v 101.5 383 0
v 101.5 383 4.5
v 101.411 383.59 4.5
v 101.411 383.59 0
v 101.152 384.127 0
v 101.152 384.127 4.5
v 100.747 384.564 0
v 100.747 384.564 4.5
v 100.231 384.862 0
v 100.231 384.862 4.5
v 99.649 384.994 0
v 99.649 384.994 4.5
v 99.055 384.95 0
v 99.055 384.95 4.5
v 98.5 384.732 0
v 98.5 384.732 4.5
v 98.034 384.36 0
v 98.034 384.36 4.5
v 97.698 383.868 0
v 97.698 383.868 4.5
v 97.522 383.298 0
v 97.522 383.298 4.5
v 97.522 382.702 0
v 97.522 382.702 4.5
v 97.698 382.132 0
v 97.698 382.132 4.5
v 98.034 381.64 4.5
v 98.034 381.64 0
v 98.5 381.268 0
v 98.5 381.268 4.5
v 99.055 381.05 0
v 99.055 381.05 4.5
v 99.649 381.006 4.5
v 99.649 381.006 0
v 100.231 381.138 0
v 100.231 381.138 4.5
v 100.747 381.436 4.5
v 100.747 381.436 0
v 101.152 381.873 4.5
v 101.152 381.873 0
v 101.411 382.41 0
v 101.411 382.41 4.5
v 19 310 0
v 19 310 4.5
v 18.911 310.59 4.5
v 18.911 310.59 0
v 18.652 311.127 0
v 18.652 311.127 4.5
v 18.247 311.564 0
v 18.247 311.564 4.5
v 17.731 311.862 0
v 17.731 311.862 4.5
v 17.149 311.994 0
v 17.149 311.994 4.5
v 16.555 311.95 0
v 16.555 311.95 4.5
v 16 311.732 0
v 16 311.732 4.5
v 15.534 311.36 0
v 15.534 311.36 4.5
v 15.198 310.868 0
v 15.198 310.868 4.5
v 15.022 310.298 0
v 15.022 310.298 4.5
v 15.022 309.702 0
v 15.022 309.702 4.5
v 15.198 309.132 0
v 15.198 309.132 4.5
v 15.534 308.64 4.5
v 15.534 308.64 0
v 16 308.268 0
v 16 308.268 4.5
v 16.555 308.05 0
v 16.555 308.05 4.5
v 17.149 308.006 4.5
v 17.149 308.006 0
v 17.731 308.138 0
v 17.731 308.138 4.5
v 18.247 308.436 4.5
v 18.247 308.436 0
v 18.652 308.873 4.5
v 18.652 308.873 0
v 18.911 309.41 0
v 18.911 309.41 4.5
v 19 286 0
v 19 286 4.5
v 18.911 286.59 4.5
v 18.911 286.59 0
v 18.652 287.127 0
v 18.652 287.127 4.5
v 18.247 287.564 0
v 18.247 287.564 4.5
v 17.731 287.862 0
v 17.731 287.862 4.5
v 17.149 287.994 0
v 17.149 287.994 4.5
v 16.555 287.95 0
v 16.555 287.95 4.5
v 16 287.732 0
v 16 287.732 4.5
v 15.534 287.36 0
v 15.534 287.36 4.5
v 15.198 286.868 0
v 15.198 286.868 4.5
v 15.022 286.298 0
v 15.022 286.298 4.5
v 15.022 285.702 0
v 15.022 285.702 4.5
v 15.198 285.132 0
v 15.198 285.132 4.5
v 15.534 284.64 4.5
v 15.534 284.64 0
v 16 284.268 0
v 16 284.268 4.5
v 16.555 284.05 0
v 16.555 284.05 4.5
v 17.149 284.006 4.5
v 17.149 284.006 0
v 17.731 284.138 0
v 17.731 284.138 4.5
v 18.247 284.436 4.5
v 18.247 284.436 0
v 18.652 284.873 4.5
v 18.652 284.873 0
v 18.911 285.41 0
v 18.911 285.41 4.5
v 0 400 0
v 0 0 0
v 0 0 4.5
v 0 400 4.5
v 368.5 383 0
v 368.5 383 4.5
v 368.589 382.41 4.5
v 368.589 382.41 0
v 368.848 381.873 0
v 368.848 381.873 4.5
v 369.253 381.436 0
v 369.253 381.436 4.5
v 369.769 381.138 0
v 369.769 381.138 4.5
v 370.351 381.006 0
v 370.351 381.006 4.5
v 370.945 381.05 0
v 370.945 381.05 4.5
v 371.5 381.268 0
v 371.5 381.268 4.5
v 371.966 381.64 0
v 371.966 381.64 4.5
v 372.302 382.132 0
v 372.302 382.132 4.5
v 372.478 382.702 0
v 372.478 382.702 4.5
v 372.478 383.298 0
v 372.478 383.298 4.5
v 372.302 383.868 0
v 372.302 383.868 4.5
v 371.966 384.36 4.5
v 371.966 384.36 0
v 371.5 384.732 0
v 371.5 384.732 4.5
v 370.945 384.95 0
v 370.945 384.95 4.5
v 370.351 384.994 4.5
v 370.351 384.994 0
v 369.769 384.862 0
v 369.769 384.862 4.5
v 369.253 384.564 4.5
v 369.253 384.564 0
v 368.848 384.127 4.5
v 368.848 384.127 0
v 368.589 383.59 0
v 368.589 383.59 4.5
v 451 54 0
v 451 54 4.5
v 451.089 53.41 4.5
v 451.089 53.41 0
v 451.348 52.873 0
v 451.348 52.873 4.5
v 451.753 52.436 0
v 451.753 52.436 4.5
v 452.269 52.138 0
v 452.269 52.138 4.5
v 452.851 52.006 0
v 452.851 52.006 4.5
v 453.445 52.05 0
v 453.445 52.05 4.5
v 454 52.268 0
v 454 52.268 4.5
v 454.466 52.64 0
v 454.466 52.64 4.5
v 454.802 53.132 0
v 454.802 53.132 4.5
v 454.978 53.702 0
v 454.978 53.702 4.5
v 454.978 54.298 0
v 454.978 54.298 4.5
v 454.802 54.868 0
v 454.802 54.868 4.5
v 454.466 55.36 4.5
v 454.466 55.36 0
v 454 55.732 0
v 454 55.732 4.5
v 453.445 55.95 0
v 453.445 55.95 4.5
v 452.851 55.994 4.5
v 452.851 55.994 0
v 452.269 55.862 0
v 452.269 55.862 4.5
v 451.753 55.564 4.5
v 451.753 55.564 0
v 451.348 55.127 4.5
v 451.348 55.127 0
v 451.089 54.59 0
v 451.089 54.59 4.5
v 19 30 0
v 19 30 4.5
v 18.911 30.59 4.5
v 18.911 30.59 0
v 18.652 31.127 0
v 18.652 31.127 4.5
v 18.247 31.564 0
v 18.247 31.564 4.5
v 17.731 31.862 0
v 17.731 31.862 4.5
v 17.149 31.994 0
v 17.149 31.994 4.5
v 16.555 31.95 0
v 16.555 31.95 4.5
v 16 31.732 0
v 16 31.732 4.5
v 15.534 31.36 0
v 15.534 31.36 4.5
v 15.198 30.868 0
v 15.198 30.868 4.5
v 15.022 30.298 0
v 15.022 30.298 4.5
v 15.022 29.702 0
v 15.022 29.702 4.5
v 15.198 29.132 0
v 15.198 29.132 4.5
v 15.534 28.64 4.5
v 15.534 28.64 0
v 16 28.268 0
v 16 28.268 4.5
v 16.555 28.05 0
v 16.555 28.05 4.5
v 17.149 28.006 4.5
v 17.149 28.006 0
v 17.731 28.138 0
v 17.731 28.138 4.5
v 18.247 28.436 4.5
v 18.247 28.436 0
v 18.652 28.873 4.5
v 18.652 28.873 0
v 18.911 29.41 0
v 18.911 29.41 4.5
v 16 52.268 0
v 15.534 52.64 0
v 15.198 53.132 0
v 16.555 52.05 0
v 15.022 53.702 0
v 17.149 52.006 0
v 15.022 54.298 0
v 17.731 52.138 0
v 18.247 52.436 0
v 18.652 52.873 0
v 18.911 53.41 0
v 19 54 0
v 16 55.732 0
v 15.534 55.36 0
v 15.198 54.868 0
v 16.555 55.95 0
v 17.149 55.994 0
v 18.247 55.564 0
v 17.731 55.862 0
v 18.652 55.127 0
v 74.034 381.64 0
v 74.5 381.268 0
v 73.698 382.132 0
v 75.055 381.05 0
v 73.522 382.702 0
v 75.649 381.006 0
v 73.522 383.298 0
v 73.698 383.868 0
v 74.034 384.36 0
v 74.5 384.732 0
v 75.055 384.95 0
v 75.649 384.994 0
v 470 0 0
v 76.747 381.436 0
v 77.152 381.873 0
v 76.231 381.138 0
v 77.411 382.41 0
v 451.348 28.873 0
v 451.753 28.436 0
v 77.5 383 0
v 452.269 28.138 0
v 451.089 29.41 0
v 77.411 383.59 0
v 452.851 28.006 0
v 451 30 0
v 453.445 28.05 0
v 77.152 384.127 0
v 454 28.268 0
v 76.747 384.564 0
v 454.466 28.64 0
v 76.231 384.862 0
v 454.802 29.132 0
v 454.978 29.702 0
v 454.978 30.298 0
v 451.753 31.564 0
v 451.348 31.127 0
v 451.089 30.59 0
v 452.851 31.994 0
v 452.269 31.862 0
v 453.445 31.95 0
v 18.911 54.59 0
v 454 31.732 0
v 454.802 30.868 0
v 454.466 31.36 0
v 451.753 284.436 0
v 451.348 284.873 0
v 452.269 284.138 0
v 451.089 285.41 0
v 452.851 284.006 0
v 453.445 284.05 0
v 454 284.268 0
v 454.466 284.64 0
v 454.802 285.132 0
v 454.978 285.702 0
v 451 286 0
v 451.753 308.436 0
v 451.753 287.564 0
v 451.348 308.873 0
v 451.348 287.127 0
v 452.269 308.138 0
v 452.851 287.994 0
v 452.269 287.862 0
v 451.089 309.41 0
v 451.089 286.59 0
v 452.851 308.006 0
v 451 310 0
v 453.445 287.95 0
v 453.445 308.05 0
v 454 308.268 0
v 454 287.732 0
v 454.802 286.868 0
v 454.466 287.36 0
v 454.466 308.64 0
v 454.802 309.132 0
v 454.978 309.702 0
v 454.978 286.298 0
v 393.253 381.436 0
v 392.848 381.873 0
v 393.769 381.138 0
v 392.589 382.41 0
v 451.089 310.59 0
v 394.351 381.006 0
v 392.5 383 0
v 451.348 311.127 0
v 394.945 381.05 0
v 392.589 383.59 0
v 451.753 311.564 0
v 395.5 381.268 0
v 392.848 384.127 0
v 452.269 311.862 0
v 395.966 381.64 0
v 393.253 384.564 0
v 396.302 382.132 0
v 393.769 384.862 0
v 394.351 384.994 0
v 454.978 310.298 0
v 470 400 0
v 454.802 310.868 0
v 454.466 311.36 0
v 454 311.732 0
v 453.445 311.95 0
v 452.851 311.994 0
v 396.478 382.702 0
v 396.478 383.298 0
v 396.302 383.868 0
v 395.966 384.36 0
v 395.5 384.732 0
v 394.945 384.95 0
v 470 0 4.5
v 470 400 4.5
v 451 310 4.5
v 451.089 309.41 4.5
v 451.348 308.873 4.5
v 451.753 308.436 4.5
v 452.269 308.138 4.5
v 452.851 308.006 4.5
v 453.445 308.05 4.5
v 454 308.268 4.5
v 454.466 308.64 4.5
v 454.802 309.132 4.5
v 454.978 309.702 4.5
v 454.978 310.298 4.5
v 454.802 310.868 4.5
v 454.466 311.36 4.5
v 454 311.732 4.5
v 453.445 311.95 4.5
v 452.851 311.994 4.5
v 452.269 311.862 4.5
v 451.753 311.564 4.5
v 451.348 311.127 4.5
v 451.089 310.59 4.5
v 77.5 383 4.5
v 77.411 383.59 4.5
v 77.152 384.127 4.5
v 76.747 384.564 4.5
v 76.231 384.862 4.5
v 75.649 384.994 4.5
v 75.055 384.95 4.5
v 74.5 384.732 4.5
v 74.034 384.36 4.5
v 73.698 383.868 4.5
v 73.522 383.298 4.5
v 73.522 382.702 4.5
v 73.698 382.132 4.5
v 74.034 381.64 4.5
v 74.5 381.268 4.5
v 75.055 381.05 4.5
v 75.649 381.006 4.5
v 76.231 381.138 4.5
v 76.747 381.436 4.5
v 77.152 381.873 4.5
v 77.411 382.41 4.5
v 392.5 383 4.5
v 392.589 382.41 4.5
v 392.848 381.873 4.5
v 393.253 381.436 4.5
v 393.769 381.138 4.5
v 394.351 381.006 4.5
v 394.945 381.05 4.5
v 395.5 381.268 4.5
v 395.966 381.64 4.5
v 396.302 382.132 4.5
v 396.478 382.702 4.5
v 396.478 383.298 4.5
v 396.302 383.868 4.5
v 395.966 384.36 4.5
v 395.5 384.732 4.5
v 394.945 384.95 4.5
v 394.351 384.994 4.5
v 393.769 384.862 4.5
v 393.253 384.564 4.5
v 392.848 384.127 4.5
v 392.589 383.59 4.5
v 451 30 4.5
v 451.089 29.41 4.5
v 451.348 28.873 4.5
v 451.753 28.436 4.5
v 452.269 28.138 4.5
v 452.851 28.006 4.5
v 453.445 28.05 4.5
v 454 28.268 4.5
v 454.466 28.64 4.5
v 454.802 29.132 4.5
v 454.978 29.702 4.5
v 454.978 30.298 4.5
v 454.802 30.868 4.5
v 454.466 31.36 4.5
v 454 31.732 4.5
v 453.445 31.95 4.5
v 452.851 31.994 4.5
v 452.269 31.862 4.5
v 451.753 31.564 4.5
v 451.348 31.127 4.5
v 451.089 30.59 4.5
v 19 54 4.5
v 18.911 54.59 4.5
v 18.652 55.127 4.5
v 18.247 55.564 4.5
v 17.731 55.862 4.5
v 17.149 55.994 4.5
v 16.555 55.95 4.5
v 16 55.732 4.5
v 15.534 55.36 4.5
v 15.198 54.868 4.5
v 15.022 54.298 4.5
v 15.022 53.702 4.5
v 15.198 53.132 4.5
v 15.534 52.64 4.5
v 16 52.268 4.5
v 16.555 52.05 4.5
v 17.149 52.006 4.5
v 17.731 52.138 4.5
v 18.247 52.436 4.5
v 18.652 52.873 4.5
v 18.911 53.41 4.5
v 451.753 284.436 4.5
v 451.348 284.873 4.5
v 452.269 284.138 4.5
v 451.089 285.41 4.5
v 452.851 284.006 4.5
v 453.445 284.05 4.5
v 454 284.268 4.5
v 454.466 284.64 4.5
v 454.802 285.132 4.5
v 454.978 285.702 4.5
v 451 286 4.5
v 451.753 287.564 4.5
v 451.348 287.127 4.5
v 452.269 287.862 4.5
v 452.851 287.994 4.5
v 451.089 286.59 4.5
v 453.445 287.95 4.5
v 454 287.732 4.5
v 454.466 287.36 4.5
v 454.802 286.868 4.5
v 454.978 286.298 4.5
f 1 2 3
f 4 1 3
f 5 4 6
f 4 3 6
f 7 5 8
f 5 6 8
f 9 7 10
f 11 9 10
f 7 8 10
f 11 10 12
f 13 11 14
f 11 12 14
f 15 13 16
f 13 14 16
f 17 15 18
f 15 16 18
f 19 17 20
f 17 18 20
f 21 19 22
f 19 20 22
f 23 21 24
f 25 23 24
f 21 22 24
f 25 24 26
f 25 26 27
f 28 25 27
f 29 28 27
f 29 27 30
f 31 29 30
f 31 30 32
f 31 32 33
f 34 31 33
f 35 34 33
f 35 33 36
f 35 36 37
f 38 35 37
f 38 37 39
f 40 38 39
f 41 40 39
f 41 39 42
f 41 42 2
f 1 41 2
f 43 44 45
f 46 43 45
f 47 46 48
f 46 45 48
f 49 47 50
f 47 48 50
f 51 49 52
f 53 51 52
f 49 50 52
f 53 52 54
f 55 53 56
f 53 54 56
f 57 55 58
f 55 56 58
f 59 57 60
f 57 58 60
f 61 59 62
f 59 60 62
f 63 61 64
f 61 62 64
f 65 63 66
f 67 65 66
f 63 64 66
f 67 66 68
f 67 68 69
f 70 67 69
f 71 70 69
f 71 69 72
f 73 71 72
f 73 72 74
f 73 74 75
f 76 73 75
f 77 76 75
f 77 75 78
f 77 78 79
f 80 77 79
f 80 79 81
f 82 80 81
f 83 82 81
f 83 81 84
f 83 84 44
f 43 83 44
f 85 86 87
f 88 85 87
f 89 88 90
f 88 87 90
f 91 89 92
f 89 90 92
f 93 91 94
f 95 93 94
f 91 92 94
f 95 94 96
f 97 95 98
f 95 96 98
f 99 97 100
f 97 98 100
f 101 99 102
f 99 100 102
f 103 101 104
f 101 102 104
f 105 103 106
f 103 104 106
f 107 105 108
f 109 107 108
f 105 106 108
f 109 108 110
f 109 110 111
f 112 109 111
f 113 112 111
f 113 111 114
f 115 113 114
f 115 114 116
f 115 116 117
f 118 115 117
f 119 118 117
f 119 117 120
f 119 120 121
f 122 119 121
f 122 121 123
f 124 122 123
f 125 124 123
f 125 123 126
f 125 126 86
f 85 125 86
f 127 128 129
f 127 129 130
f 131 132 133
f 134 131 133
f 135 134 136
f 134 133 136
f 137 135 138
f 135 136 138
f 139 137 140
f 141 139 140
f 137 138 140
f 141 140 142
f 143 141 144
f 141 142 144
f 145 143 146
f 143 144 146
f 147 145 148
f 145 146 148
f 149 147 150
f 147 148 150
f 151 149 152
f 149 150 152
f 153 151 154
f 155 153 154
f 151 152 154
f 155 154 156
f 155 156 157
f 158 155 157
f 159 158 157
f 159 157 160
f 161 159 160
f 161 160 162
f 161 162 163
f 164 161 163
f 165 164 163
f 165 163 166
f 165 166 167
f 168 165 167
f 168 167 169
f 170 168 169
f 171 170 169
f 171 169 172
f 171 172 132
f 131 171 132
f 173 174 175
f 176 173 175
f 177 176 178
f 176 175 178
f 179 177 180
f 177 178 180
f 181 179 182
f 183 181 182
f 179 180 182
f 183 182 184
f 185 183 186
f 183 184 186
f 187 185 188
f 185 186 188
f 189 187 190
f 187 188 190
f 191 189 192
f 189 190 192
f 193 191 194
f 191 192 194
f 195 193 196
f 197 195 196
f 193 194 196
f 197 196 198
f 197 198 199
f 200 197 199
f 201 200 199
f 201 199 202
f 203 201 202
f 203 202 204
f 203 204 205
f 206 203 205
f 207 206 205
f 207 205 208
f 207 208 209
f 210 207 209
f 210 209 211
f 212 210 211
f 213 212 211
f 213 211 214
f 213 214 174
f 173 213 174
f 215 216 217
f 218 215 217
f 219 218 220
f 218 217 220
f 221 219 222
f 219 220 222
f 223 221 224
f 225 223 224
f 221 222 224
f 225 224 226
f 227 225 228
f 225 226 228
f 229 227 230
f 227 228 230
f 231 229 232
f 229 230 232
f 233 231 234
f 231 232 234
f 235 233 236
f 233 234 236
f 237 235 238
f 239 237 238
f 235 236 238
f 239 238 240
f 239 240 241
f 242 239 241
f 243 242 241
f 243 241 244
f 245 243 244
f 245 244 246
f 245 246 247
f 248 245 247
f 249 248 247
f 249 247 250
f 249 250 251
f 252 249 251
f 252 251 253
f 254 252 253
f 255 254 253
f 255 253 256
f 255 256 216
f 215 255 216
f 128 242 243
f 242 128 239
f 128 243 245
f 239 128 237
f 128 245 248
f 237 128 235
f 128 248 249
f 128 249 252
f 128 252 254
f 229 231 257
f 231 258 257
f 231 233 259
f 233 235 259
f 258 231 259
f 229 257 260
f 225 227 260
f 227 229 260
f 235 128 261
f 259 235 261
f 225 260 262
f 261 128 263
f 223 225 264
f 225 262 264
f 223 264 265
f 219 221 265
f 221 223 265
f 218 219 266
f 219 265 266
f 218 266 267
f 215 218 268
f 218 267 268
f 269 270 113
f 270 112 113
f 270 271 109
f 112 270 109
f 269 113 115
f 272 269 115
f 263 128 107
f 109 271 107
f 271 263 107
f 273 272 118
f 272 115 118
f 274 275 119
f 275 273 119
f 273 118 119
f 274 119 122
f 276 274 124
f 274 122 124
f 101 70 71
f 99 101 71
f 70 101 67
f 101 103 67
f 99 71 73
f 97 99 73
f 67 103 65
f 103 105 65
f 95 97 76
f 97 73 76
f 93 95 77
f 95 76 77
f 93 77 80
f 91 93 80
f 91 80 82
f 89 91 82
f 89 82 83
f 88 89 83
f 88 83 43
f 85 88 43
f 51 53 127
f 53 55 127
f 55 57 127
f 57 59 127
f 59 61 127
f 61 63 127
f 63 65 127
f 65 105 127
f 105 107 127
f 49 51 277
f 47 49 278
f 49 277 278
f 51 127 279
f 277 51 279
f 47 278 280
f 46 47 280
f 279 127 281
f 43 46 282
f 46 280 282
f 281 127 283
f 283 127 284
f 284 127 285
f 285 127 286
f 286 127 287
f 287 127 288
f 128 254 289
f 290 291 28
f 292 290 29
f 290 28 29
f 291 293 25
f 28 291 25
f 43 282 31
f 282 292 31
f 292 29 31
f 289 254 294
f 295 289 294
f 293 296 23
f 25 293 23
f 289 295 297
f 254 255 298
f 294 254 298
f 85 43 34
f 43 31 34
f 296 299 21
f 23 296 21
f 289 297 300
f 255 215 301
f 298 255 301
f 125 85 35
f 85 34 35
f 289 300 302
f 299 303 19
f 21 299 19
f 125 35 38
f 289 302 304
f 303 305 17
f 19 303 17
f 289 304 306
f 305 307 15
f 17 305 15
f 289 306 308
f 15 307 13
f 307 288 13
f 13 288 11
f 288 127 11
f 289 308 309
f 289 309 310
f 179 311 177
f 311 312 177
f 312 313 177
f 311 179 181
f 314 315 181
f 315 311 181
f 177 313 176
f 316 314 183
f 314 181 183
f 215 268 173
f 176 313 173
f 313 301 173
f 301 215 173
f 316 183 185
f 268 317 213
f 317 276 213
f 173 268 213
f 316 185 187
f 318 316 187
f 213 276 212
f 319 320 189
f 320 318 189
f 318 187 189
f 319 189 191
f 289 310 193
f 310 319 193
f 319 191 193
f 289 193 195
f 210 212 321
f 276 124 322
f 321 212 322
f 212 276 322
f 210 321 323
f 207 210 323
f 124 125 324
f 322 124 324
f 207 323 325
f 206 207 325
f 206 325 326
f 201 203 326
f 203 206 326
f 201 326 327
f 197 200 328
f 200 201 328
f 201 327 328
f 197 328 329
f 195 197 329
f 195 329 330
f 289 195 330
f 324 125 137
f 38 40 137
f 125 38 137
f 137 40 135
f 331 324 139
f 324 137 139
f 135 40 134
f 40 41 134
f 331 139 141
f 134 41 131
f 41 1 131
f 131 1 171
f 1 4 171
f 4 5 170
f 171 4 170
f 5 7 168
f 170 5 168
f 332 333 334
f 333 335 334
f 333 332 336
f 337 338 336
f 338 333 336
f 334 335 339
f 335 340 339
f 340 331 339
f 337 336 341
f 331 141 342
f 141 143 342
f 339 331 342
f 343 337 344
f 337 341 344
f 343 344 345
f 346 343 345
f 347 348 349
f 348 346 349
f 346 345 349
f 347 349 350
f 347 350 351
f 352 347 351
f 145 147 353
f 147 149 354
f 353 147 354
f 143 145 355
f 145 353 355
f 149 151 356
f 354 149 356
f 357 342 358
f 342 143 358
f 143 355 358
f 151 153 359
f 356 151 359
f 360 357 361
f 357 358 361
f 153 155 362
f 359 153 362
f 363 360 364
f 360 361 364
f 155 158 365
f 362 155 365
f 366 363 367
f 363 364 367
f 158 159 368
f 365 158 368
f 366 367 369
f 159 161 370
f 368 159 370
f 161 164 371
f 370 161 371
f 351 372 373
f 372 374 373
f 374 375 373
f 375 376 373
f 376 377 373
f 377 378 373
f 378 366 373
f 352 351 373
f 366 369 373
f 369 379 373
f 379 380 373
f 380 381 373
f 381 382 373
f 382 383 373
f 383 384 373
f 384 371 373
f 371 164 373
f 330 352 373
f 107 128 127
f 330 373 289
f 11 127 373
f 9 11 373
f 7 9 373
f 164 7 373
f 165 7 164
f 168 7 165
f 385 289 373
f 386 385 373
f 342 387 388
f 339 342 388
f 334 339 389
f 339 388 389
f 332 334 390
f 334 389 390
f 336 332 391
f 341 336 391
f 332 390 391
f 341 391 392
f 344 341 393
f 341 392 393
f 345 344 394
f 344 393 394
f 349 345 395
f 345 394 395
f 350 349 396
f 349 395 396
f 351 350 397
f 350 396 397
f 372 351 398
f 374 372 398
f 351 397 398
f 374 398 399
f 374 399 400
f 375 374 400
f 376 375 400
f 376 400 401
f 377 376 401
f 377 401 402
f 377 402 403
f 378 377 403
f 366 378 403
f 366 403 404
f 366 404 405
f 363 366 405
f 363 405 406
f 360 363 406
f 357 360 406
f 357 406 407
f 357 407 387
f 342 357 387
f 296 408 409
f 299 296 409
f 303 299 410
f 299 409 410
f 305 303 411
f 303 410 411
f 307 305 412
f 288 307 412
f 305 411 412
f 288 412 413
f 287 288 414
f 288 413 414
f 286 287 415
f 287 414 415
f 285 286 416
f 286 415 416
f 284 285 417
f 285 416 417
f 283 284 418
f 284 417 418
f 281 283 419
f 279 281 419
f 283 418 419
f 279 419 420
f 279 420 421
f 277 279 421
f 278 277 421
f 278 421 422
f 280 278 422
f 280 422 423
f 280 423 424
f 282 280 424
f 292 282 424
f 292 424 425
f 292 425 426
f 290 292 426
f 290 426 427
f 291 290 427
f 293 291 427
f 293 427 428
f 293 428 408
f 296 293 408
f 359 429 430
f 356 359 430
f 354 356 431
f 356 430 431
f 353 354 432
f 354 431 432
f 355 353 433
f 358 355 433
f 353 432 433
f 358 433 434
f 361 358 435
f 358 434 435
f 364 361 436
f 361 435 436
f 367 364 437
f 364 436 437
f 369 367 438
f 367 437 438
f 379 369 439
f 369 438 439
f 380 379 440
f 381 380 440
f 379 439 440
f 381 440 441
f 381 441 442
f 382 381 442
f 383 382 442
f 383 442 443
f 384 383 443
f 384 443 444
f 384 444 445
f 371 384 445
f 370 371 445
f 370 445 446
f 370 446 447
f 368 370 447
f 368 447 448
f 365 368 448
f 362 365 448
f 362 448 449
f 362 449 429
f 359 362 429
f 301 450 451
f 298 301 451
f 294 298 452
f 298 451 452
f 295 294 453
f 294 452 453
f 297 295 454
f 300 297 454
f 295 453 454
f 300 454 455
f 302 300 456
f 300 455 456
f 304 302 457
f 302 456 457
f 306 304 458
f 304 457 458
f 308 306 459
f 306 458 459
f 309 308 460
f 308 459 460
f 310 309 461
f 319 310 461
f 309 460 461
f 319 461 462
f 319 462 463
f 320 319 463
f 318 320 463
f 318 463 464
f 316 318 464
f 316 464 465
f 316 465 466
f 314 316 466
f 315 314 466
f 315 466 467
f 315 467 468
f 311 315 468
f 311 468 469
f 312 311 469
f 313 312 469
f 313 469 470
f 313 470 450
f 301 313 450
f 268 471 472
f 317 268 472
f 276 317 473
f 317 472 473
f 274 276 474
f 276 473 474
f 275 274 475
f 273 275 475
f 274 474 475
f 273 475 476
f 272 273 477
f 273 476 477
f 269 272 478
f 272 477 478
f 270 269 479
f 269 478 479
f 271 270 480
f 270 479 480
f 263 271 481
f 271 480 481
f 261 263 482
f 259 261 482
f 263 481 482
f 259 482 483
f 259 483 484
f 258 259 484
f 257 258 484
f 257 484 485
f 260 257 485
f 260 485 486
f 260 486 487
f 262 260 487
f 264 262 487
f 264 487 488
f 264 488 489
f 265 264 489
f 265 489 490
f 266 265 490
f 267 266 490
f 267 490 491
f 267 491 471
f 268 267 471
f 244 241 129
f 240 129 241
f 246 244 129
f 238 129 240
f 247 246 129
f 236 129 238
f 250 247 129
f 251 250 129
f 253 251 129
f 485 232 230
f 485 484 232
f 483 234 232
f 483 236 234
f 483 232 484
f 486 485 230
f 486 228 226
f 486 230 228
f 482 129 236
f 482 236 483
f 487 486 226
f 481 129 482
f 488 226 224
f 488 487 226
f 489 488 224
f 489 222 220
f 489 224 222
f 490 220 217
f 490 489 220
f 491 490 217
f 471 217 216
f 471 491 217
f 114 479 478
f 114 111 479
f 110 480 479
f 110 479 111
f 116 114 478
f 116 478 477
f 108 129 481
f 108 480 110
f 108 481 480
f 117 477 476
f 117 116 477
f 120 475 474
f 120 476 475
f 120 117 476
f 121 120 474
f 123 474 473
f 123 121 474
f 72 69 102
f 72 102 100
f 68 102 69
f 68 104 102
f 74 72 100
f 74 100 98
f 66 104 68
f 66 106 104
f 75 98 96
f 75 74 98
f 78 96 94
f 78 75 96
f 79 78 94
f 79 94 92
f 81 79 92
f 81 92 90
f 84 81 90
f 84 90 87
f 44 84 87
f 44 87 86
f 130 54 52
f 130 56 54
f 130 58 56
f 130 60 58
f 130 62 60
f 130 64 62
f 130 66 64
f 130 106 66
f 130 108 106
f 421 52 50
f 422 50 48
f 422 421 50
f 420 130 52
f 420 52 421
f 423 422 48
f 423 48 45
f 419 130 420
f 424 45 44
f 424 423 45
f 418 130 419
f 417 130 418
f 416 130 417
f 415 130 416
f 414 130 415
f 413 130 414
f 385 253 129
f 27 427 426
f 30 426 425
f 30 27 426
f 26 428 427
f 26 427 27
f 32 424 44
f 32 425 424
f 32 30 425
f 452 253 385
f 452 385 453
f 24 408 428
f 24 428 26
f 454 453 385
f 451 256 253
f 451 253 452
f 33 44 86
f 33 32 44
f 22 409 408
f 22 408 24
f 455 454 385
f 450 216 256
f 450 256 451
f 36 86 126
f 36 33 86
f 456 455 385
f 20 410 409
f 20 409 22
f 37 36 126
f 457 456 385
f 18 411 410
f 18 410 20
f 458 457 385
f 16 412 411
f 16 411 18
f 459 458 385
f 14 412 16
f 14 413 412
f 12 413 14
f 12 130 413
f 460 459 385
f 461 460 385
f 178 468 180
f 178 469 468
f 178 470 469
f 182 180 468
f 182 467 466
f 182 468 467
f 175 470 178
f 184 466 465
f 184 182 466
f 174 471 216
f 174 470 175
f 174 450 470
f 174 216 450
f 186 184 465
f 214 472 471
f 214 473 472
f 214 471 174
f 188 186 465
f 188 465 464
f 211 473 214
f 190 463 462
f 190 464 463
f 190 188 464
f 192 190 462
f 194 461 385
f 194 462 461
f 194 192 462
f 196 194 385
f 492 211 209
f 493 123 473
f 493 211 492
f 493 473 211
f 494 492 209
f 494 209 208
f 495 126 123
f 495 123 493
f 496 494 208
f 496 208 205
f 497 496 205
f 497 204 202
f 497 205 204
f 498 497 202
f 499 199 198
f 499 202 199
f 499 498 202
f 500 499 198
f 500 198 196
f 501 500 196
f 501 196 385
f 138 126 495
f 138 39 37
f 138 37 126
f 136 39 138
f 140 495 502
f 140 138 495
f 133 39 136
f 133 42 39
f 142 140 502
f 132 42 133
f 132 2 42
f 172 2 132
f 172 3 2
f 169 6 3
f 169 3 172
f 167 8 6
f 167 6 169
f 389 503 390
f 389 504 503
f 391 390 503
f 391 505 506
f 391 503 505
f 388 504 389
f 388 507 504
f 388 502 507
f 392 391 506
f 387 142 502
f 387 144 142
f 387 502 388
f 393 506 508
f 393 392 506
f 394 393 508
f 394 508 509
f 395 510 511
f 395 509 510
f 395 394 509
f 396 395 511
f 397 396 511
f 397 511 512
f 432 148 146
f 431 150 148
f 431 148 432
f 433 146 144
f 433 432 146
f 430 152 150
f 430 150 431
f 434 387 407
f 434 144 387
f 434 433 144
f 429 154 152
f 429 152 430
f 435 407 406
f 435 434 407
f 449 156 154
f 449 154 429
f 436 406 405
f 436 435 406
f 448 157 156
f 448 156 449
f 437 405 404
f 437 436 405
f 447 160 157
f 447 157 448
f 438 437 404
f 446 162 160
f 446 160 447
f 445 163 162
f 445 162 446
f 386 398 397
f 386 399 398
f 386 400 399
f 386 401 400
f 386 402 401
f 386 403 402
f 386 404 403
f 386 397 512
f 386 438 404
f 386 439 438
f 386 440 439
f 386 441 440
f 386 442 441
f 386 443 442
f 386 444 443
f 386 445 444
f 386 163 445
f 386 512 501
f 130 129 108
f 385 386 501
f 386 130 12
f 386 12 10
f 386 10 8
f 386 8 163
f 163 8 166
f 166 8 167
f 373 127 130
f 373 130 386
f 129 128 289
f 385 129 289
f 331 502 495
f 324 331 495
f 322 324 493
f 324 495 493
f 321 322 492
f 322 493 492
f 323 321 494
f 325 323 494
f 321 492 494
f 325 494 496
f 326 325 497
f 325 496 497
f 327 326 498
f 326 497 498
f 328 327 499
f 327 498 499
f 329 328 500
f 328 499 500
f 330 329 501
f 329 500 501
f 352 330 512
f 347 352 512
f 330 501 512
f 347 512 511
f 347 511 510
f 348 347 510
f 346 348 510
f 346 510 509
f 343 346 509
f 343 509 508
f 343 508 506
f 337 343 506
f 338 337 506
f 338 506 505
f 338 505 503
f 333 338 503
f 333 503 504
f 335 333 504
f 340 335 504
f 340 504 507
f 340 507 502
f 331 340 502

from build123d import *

# Parameters (mm, degrees)
SKETCH_1_W          = 470
SKETCH_1_H          = 400
EXTRUDE_1_DEPTH     = 4.5
SKETCH_2_R          = 2
CUT_EXTRUDE_1_DEPTH = 10


with BuildPart() as part:
    # 草图1 → 凸台-拉伸1 (new body)
    with BuildSketch(Plane.XY):
        with Locations((235, 200)):
            Rectangle(SKETCH_1_W, SKETCH_1_H)
    extrude(amount=EXTRUDE_1_DEPTH)

    # 草图2 → 切除-拉伸1 (cut)
    with BuildSketch(Plane.XY.offset(4.5)):
        with Locations((99.5, 383)):
            Circle(SKETCH_2_R)
        with Locations((75.5, 383)):
            Circle(SKETCH_2_R)
        with Locations((17, 310)):
            Circle(SKETCH_2_R)
        with Locations((17, 286)):
            Circle(SKETCH_2_R)
        with Locations((17, 54)):
            Circle(SKETCH_2_R)
        with Locations((17, 30)):
            Circle(SKETCH_2_R)
        with Locations(Location((453, 30, 0), (0, 0, 180))):
            Circle(SKETCH_2_R)
        with Locations(Location((453, 54, 0), (0, 0, 180))):
            Circle(SKETCH_2_R)
        with Locations(Location((453, 286, 0), (0, 0, 180))):
            Circle(SKETCH_2_R)
        with Locations(Location((453, 310, 0), (0, 0, 180))):
            Circle(SKETCH_2_R)
        with Locations(Location((394.5, 383, 0), (0, 0, 180))):
            Circle(SKETCH_2_R)
        with Locations(Location((370.5, 383, 0), (0, 0, 180))):
            Circle(SKETCH_2_R)
    extrude(amount=-CUT_EXTRUDE_1_DEPTH, mode=Mode.SUBTRACT)


solid = part.part
